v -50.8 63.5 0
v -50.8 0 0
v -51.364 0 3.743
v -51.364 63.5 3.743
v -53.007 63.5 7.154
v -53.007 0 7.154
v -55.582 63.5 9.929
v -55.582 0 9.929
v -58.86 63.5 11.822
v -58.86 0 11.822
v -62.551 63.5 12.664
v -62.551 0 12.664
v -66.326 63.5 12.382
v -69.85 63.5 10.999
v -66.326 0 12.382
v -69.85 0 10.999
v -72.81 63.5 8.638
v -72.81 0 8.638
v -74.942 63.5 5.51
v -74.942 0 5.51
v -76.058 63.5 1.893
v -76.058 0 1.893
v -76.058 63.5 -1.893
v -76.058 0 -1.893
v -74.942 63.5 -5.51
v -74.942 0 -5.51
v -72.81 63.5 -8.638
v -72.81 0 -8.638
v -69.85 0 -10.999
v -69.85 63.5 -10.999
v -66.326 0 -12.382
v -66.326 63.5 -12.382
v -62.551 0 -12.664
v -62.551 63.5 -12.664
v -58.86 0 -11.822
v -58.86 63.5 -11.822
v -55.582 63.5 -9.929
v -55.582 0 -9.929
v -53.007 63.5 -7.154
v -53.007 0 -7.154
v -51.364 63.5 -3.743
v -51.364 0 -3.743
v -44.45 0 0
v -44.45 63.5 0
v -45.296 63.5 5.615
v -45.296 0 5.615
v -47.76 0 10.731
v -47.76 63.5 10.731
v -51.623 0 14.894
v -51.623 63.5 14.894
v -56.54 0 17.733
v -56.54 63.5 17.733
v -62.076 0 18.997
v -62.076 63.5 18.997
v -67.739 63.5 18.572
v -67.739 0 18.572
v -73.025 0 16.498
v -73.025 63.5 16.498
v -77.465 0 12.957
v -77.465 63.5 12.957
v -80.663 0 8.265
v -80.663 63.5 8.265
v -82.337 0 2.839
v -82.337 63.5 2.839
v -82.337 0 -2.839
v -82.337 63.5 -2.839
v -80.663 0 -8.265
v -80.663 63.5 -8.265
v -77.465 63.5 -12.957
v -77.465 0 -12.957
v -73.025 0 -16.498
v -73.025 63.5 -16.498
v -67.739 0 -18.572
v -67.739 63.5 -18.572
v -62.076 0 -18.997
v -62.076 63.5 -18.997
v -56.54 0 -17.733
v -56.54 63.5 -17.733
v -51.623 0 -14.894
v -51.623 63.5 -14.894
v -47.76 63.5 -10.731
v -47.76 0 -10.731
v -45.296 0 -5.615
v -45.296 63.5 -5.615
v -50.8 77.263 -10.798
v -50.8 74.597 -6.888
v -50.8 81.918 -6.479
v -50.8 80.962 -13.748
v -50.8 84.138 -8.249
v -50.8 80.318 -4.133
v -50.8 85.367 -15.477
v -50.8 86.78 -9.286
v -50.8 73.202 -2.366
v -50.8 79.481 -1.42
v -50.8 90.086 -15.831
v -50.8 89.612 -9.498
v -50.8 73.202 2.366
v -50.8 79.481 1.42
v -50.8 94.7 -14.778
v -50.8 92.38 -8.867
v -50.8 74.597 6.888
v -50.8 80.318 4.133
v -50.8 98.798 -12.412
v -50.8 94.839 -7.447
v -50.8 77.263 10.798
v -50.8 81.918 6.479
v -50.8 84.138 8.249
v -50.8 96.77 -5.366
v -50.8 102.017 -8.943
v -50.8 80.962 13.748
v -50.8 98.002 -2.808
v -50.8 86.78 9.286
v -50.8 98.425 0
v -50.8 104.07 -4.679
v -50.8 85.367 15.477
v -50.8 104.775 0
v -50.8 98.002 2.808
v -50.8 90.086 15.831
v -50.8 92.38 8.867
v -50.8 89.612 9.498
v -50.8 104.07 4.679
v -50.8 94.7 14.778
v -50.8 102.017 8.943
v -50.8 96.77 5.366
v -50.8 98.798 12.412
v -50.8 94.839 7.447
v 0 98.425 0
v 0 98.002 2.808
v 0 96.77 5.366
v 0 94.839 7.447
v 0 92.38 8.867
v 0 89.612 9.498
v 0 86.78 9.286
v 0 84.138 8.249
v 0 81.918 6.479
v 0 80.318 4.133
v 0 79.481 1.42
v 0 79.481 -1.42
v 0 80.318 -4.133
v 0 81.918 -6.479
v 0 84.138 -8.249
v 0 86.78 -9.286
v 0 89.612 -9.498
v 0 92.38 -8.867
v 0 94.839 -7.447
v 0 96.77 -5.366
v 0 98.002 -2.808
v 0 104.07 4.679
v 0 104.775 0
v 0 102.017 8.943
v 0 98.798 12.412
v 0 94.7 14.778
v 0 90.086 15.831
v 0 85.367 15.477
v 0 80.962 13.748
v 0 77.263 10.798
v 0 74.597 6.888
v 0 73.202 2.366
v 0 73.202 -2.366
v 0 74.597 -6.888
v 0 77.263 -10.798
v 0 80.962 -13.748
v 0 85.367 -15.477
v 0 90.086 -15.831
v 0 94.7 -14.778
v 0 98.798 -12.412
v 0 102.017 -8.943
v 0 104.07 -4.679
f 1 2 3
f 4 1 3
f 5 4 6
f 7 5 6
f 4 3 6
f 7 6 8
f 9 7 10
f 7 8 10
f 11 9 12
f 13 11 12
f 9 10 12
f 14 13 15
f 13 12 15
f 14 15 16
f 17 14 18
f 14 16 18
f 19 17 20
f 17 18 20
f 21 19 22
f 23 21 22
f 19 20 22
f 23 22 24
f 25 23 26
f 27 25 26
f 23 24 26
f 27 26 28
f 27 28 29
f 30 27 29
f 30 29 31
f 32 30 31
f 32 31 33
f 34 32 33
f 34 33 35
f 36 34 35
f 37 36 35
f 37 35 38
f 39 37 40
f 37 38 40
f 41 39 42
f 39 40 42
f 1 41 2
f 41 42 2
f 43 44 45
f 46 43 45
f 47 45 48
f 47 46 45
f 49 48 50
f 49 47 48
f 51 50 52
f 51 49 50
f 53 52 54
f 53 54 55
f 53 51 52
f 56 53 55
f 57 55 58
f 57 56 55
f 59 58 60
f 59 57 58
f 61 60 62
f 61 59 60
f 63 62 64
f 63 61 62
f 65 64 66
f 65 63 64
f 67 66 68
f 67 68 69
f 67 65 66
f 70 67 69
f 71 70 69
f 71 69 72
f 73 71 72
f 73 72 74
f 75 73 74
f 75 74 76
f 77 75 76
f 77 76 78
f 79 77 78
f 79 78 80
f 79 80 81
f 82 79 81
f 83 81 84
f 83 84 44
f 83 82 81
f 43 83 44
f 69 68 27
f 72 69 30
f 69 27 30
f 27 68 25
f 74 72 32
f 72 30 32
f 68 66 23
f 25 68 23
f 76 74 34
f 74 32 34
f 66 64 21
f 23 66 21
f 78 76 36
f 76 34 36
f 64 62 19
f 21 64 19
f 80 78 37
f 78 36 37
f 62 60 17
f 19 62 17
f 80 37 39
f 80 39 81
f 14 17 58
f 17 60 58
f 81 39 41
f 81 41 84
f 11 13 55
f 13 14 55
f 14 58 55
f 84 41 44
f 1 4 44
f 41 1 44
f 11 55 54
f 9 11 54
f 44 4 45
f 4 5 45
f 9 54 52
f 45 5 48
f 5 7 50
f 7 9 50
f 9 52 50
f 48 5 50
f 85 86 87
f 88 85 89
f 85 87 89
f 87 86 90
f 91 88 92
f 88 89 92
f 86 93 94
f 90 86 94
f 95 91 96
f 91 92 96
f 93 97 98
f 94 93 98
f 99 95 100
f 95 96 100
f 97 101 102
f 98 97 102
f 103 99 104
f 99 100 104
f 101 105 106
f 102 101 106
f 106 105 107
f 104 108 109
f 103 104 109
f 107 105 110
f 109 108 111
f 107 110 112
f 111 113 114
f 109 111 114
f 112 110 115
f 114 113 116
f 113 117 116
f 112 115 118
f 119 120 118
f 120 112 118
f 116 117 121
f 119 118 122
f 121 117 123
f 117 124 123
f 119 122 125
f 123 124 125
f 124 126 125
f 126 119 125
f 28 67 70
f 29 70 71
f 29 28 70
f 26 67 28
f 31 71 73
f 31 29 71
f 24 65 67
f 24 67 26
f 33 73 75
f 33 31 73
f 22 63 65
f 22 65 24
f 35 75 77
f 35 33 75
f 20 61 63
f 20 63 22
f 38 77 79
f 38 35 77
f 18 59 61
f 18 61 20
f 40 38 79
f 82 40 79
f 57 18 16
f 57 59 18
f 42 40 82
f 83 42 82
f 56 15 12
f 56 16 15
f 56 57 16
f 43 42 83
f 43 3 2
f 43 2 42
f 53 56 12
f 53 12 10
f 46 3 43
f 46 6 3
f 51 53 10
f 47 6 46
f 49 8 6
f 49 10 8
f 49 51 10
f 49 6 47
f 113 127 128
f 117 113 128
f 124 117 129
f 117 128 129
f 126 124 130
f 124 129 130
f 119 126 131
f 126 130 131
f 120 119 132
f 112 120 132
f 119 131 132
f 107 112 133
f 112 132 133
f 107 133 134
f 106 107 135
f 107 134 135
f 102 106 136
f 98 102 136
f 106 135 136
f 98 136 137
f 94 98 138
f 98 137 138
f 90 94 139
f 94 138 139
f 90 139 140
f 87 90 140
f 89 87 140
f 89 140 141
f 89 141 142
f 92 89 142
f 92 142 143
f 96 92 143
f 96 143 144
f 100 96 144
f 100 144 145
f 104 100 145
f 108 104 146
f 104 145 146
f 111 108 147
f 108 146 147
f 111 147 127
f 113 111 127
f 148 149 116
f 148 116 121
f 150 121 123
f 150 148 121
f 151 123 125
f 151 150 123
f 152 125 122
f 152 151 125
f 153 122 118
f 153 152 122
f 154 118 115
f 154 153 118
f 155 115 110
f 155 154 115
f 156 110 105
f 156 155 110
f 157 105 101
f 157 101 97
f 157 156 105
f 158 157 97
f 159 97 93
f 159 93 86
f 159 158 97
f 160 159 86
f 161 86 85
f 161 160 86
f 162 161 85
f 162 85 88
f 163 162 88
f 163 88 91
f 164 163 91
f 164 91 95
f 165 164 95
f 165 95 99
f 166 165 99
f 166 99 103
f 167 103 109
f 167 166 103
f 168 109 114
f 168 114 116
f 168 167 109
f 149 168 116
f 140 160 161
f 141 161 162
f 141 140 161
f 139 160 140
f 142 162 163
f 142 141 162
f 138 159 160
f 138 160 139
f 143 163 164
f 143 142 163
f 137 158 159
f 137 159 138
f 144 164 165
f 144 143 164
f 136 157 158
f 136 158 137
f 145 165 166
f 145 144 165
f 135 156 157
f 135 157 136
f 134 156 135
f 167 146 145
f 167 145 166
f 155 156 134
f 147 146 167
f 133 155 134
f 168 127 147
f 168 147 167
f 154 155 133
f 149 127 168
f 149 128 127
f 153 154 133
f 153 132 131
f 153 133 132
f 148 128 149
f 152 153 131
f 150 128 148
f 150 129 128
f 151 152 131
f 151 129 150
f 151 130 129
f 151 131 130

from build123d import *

# Parameters (mm, degrees)
F0_R     = 19.05
F0_R_2   = 12.7
F2_DEPTH = 63.5
F3_R     = 15.875
F3_R_2   = 9.525
F5_DEPTH = 50.8


# Not quite as in the source:
# - a variable given as a bare number and used for a length is read in inches; the dataset says mm whatever the document's units were


with BuildPart() as f2:
    # F0 (on Front) → F2 (new body)
    with BuildSketch(Plane.XZ):
        with Locations((-63.5, 0)):
            Circle(F0_R)
        with Locations((-63.5, 0)):
            Circle(F0_R_2, mode=Mode.SUBTRACT)
    extrude(amount=-F2_DEPTH)


with BuildPart() as f5:
    # F3 (on Right) → F5 (new body)
    with BuildSketch(Plane.YZ):
        with Locations((88.9, 0)):
            Circle(F3_R)
        with Locations((88.9, 0)):
            Circle(F3_R_2, mode=Mode.SUBTRACT)
    extrude(amount=-F5_DEPTH)


solid = Compound([f2.part, f5.part])
